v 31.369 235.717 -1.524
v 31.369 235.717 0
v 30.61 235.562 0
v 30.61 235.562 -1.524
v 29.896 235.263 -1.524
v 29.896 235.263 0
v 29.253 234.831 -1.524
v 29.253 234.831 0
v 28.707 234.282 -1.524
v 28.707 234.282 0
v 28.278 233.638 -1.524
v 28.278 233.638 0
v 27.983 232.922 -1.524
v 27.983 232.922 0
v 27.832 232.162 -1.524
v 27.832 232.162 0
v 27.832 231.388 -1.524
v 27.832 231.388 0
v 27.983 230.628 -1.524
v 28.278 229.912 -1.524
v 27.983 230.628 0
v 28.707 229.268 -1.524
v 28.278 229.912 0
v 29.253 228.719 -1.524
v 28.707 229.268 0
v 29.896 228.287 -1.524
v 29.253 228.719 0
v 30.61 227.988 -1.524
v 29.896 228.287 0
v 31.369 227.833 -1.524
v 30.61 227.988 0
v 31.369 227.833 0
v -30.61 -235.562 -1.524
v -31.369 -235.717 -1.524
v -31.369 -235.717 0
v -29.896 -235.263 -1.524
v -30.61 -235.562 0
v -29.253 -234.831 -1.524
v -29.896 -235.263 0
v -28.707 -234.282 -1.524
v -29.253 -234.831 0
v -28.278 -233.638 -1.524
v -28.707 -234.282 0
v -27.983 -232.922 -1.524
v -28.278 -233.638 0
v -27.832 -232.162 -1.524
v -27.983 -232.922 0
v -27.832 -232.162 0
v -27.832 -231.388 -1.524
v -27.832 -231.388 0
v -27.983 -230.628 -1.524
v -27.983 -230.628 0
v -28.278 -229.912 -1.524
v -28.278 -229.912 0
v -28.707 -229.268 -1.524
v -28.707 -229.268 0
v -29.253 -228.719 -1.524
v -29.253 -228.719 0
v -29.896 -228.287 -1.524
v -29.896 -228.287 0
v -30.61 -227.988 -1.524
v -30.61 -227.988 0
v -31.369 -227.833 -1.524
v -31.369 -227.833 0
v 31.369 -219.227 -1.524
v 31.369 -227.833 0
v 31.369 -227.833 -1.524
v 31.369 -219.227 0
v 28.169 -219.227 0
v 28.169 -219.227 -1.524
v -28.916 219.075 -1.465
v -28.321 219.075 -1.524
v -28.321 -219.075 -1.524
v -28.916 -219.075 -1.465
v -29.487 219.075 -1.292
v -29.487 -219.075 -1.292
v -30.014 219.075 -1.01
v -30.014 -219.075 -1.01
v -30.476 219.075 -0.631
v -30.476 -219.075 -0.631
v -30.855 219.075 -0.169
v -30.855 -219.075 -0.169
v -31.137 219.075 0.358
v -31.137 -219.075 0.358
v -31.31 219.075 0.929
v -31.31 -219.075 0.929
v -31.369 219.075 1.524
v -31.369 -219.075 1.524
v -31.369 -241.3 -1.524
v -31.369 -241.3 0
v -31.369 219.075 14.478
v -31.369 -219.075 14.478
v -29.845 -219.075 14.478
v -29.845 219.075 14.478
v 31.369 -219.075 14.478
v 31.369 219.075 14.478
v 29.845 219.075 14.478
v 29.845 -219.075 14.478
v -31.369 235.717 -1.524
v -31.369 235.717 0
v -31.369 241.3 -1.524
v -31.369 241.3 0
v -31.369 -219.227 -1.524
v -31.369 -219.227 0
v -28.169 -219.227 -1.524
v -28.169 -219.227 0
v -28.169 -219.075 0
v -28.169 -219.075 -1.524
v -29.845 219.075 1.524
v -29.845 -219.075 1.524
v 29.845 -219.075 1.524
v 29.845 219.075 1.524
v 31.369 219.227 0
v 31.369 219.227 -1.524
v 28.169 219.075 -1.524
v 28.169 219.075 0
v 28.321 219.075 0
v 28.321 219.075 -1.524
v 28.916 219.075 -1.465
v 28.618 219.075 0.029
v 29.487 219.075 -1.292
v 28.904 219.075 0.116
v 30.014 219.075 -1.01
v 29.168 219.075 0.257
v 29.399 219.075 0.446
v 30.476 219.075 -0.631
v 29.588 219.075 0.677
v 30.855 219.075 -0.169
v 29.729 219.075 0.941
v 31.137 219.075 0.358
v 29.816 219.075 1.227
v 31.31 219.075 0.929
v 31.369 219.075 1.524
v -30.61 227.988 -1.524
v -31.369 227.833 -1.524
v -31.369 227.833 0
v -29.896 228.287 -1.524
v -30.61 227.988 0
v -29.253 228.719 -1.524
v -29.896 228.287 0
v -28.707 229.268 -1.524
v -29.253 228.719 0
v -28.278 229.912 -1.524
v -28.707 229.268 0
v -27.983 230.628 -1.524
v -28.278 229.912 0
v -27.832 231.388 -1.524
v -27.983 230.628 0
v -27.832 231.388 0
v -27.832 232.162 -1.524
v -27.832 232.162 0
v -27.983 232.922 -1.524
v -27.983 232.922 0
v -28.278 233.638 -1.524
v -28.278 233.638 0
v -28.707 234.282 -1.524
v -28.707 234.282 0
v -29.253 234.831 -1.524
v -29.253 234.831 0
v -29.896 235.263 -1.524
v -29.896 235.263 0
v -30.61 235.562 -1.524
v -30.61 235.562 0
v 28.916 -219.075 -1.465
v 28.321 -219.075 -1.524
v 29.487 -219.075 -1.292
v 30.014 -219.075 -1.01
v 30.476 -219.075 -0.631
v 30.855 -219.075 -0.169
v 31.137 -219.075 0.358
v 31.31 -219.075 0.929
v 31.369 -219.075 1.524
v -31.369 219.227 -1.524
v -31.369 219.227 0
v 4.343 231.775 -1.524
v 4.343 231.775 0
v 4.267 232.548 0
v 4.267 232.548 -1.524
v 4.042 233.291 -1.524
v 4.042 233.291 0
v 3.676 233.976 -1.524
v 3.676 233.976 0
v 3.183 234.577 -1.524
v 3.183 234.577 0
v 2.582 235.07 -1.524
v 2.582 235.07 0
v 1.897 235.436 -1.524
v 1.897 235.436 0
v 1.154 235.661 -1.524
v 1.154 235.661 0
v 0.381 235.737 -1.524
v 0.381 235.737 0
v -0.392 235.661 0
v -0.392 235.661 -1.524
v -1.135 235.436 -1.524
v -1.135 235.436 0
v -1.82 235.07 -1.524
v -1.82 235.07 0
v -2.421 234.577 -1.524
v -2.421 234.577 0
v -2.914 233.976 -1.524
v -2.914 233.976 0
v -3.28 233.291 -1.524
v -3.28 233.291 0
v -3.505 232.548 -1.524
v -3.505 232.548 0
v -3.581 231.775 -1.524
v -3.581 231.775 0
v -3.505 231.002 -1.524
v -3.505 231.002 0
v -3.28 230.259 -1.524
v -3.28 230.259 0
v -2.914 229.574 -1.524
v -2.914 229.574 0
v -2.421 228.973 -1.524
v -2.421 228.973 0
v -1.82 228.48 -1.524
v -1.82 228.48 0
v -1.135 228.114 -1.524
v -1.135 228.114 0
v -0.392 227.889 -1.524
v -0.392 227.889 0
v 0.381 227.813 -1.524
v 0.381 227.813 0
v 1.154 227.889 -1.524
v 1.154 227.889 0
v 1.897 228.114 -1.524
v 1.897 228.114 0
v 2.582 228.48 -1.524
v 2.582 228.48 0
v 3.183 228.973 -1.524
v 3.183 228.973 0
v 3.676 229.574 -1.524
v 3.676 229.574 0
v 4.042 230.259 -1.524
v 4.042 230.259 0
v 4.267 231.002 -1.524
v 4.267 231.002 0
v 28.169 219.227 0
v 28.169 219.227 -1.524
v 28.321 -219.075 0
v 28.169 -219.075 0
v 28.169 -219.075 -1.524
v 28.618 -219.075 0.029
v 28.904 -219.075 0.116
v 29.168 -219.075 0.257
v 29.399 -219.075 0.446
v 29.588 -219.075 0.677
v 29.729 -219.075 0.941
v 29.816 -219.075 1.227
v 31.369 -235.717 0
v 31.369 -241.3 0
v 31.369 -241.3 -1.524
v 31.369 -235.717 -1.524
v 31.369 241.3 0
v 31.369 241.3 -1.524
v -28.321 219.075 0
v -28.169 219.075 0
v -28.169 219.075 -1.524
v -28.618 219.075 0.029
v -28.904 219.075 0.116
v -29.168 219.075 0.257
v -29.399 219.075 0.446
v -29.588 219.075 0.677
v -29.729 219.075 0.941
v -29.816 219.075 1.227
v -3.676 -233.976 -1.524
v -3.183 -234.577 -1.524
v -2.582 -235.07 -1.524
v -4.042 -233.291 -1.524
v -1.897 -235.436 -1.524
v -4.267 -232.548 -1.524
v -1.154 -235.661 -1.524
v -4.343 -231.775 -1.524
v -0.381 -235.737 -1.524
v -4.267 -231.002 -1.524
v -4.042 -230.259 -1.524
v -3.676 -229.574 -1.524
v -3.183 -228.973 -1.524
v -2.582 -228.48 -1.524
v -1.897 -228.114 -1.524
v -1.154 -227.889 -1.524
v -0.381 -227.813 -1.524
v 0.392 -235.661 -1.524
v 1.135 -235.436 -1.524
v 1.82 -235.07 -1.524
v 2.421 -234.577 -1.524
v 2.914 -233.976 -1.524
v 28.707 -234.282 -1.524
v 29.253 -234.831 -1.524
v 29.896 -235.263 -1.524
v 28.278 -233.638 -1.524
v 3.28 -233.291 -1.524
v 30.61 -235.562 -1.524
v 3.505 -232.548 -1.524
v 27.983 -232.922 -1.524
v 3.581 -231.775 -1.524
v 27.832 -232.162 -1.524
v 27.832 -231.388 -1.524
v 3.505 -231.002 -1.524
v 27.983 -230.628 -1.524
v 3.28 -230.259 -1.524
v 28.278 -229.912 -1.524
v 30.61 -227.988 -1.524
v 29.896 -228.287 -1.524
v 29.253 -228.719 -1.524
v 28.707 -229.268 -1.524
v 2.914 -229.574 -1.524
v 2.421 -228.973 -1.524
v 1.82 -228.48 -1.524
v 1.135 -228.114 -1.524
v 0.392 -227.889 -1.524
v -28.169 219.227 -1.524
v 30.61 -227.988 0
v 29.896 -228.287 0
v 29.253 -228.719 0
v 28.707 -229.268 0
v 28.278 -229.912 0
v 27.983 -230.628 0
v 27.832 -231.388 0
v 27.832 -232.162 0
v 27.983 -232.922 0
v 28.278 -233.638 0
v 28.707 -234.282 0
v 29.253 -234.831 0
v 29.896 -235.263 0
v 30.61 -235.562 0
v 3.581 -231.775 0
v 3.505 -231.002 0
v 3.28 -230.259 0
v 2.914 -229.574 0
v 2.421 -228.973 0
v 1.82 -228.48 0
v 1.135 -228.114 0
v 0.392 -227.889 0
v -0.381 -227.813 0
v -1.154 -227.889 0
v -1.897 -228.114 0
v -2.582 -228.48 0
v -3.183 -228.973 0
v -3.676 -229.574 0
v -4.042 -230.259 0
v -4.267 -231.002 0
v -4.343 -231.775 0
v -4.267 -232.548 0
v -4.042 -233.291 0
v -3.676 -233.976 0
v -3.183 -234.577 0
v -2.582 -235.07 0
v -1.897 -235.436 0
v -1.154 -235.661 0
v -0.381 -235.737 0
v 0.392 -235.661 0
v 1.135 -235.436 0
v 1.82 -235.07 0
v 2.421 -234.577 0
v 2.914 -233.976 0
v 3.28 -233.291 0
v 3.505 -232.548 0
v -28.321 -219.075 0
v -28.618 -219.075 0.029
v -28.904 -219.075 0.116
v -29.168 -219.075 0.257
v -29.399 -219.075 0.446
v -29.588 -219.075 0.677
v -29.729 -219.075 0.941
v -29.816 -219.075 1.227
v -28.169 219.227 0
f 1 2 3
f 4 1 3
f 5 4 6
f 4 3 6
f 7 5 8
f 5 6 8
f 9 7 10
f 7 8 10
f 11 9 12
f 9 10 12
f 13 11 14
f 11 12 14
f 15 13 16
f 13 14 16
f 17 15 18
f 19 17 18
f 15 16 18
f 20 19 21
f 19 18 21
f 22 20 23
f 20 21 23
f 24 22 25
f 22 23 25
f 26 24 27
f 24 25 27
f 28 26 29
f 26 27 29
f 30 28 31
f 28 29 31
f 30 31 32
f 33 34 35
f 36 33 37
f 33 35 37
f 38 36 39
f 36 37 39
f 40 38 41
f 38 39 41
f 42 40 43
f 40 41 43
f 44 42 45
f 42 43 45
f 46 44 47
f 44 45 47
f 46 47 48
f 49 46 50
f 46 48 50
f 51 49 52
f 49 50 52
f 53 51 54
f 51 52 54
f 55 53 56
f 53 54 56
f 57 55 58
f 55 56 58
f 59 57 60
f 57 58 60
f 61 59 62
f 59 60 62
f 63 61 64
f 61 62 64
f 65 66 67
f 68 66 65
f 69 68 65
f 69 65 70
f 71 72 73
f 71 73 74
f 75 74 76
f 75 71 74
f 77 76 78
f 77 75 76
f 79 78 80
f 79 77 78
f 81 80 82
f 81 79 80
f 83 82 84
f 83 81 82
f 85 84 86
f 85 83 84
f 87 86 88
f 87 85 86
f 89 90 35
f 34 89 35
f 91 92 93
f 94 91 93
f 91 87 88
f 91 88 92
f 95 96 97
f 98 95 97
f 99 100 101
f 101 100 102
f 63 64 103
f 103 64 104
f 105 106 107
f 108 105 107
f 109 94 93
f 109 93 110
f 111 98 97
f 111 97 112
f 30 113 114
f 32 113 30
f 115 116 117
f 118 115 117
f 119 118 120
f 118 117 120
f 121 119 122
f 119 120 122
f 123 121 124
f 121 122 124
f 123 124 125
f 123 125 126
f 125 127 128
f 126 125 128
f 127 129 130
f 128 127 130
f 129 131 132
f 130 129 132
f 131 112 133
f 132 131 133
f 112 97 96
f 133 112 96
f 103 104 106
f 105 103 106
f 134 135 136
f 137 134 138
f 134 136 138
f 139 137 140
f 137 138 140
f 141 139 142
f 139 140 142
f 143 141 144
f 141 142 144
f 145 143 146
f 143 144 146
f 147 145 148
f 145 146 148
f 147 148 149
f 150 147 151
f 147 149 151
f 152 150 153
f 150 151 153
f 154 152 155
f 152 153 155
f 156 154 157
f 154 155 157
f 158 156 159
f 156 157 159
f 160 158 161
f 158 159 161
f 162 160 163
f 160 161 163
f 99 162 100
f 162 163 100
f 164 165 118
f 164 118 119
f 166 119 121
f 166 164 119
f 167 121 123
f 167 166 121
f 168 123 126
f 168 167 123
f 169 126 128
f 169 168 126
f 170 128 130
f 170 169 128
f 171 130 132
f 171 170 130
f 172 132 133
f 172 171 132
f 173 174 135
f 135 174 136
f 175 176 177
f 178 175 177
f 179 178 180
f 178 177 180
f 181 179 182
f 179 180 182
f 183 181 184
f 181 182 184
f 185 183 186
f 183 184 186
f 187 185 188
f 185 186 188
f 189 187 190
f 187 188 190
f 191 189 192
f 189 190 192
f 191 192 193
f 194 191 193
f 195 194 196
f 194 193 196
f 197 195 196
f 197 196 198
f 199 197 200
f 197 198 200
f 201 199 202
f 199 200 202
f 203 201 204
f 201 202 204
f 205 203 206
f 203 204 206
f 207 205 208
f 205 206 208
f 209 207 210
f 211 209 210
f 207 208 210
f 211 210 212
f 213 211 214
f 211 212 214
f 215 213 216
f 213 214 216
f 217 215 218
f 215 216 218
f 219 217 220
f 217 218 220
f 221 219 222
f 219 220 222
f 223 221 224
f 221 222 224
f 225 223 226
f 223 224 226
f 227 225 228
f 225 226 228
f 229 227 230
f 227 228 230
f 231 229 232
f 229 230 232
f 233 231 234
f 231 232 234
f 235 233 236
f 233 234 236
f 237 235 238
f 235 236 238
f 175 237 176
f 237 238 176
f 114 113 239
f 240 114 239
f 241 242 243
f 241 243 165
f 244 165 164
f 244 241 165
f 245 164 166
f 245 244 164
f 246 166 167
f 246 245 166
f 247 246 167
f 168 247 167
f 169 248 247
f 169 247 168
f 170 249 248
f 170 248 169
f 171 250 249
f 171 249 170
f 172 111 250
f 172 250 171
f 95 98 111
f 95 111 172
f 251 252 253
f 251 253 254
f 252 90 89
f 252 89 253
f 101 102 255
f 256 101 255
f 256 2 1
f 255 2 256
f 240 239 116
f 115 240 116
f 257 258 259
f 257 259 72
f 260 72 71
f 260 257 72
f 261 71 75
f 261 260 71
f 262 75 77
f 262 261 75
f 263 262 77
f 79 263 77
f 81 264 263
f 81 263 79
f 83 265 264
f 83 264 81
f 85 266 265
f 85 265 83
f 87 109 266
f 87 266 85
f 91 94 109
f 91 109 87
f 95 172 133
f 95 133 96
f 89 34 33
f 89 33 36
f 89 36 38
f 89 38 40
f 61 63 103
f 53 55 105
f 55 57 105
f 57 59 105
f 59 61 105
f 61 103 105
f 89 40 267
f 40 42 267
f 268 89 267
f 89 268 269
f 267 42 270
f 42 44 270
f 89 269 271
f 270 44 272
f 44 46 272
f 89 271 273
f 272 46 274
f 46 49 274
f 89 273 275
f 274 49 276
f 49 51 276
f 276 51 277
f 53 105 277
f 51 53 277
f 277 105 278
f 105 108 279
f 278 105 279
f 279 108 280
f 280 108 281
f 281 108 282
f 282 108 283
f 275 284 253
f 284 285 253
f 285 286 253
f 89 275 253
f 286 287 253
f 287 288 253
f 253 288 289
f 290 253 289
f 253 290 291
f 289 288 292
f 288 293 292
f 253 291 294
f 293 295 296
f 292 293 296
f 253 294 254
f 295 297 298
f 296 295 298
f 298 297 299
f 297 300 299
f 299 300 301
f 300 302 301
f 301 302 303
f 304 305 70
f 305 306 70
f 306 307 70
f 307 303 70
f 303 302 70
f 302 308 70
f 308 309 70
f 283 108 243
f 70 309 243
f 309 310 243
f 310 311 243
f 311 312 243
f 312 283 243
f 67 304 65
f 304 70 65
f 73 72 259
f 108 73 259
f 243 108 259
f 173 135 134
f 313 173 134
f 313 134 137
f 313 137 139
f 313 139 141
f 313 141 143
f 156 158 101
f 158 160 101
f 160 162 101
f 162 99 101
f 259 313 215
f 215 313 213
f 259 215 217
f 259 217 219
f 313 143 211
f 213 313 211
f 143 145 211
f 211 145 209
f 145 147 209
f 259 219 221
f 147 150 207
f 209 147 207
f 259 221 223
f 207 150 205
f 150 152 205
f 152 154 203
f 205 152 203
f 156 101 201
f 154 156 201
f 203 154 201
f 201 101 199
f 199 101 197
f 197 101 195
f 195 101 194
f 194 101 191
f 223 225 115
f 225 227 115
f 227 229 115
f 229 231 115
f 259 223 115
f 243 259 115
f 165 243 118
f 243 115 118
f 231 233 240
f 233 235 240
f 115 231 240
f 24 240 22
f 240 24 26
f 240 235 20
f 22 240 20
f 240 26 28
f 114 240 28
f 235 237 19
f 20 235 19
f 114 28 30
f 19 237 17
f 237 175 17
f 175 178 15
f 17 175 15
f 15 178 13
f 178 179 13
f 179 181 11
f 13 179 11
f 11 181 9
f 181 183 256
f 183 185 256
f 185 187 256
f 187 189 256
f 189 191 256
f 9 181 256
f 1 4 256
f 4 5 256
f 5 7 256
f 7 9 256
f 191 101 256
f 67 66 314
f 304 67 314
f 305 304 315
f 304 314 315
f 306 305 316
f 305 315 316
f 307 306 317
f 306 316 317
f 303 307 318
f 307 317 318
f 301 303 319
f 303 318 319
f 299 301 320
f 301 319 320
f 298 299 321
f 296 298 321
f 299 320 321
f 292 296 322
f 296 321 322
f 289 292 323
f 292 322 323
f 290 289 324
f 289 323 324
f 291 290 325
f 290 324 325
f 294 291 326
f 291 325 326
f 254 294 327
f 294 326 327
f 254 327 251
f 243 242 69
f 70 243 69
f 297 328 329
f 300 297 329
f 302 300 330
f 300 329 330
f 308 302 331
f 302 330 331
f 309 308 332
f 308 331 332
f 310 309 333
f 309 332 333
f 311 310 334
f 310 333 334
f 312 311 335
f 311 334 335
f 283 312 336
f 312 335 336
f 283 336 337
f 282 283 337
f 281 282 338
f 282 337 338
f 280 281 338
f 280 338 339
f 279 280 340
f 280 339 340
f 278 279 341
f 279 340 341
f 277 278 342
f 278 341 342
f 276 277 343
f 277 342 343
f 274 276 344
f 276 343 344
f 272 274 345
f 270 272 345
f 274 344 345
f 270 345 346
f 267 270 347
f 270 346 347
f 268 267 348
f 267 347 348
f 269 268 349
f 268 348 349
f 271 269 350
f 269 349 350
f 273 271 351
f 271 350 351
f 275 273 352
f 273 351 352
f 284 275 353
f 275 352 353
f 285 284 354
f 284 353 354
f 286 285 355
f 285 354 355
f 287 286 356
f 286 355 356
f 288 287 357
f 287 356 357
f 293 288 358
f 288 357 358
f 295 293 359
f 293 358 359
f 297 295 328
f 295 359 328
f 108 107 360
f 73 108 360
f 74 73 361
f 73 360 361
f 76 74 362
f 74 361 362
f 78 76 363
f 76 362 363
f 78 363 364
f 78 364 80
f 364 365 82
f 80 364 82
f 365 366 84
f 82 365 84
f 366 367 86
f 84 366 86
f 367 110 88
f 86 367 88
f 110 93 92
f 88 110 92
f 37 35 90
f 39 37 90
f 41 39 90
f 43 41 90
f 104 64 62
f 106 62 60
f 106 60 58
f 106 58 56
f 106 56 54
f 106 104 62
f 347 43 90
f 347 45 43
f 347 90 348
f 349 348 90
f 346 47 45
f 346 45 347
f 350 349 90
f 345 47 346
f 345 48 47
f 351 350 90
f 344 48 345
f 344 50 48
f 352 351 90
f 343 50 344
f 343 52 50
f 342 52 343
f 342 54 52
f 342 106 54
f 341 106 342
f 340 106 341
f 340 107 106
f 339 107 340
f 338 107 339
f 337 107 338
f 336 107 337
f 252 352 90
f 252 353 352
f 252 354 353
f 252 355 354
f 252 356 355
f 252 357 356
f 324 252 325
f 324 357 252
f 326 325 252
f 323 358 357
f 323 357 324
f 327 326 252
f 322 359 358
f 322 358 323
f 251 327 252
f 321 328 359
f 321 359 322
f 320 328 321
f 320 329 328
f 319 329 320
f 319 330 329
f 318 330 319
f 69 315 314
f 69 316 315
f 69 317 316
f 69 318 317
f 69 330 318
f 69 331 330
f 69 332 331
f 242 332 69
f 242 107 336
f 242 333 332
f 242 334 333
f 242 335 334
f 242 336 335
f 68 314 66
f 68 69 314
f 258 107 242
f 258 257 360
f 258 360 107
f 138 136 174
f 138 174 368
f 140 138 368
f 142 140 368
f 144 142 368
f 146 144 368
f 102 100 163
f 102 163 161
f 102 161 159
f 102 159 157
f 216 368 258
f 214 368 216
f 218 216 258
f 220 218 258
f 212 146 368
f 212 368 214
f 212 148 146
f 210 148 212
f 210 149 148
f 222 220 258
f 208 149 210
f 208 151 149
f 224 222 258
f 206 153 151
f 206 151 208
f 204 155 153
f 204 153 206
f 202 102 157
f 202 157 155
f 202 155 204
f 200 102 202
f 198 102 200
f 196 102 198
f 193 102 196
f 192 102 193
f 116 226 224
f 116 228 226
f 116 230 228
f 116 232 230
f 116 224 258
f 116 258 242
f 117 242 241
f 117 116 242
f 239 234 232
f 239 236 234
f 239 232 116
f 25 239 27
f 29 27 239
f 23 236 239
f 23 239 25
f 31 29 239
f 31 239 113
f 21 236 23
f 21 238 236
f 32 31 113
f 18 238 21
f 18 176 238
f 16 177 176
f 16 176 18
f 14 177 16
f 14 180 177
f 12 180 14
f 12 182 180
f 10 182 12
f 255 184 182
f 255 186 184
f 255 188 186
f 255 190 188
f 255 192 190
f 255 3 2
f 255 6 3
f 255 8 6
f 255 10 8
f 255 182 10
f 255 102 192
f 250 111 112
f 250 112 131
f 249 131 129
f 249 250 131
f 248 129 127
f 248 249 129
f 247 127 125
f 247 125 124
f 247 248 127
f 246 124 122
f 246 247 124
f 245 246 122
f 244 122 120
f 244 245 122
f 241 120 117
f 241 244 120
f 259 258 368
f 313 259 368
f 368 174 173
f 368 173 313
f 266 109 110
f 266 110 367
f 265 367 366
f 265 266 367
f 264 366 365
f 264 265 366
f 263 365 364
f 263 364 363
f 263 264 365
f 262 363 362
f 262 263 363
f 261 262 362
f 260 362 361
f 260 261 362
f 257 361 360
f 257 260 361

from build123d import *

# Parameters (mm, degrees)
CROQUIS1_W                          = 62.738
CROQUIS1_H                          = 482.6
CROQUIS1_R                          = 3.9624
BRIDA_BASE1_DEPTH                   = 1.524
BRIDA_DE_ARISTA1_STRIP_W            = 9.144
BRIDA_DE_ARISTA1_STRIP_H            = 1.524
BRIDA_DE_ARISTA1_STRIP_CUT_DEPTH    = 438.15
BRIDA_DE_ARISTA1_RELIEF_W           = 9.2964
BRIDA_DE_ARISTA1_RELIEF_H           = 0.1524
BRIDA_DE_ARISTA1_RELIEF_CUT_DEPTH   = 1.524
BRIDA_DE_ARISTA1_STRIP_2_W          = 9.144
BRIDA_DE_ARISTA1_STRIP_2_H          = 1.524
BRIDA_DE_ARISTA1_STRIP_CUT_2_DEPTH  = 438.15
BRIDA_DE_ARISTA1_RELIEF_2_W         = 9.2964
BRIDA_DE_ARISTA1_RELIEF_2_H         = 0.1524
BRIDA_DE_ARISTA1_RELIEF_CUT_2_DEPTH = 1.524
BRIDA_DE_ARISTA1_DEPTH              = 438.15
BRIDA_DE_ARISTA1_BEND_DEPTH         = 438.15
CROQUIS15_R                         = 3.9624
CORTAR_EXTRUIR1_DEPTH               = 244.760777495


# Sheet-metal steps are written as plain solids
with BuildPart() as part:
    # Croquis1 → Brida base1 (new body)
    with BuildSketch(Plane.XY):
        Rectangle(CROQUIS1_W, CROQUIS1_H)
        with Locations((0.381, 231.775)):
            Circle(CROQUIS1_R, mode=Mode.SUBTRACT)
        with Locations((-0.381, -231.775)):
            Circle(CROQUIS1_R, mode=Mode.SUBTRACT)
    extrude(amount=-BRIDA_BASE1_DEPTH)

    # Brida de arista1 strip (across the edge) → Brida de arista1 strip cut (cut)
    with BuildSketch(Plane(origin=(31.369, -219.075, 0), x_dir=(-1, 0, 0), z_dir=(0, 1, 0))):
        with Locations((-1.524, -0.762)):
            Rectangle(BRIDA_DE_ARISTA1_STRIP_W, BRIDA_DE_ARISTA1_STRIP_H)
    extrude(amount=BRIDA_DE_ARISTA1_STRIP_CUT_DEPTH, mode=Mode.SUBTRACT)

    # Brida de arista1 relief (on the sheet) → Brida de arista1 relief cut (cut)
    with BuildSketch(Plane(origin=(28.321, -219.075, 0), x_dir=(-1, 0, 0), z_dir=(0, 0, 1))):
        with Locations((-4.4958, 0.0762)):
            Rectangle(BRIDA_DE_ARISTA1_RELIEF_W, BRIDA_DE_ARISTA1_RELIEF_H)
        with Locations((-4.4958, -438.2262)):
            Rectangle(BRIDA_DE_ARISTA1_RELIEF_W, BRIDA_DE_ARISTA1_RELIEF_H)
    extrude(amount=-BRIDA_DE_ARISTA1_RELIEF_CUT_DEPTH, mode=Mode.SUBTRACT)

    # Brida de arista1 strip 2 (across the edge) → Brida de arista1 strip cut 2 (cut)
    with BuildSketch(Plane(origin=(-31.369, 219.075, 0), x_dir=(1, 0, 0), z_dir=(0, -1, 0))):
        with Locations((-1.524, -0.762)):
            Rectangle(BRIDA_DE_ARISTA1_STRIP_2_W, BRIDA_DE_ARISTA1_STRIP_2_H)
    extrude(amount=BRIDA_DE_ARISTA1_STRIP_CUT_2_DEPTH, mode=Mode.SUBTRACT)

    # Brida de arista1 relief 2 (on the sheet) → Brida de arista1 relief cut 2 (cut)
    with BuildSketch(Plane(origin=(-28.321, 219.075, 0), x_dir=(1, 0, 0), z_dir=(0, 0, 1))):
        with Locations((-4.4958, 0.0762)):
            Rectangle(BRIDA_DE_ARISTA1_RELIEF_2_W, BRIDA_DE_ARISTA1_RELIEF_2_H)
        with Locations((-4.4958, -438.2262)):
            Rectangle(BRIDA_DE_ARISTA1_RELIEF_2_W, BRIDA_DE_ARISTA1_RELIEF_2_H)
    extrude(amount=-BRIDA_DE_ARISTA1_RELIEF_CUT_2_DEPTH, mode=Mode.SUBTRACT)

    # Brida de arista1 section (across the edge) → Brida de arista1 (add)
    with BuildSketch(Plane(origin=(31.369, -219.075, 0), x_dir=(-1, 0, 0), z_dir=(0, 1, 0))):
        with BuildLine():
            Line((0, 1.524), (0, 14.478))
            Line((0, 14.478), (1.524, 14.478))
            Line((1.524, 14.478), (1.524, 1.524))
            ThreePointArc((1.524, 1.524), (1.970369265, 0.446369265), (3.048, 0))
            Line((3.048, 0), (3.048, -1.524))
            ThreePointArc((3.048, -1.524), (0.892738531, -0.631261469), (0, 1.524))
        make_face()
    extrude(amount=BRIDA_DE_ARISTA1_DEPTH)

    # Brida de arista1 section 2 (across the edge) → Brida de arista1 bend (add)
    with BuildSketch(Plane(origin=(-31.369, 219.075, 0), x_dir=(1, 0, 0), z_dir=(0, -1, 0))):
        with BuildLine():
            Line((0, 1.524), (0, 14.478))
            Line((0, 14.478), (1.524, 14.478))
            Line((1.524, 14.478), (1.524, 1.524))
            ThreePointArc((1.524, 1.524), (1.970369265, 0.446369265), (3.048, 0))
            Line((3.048, 0), (3.048, -1.524))
            ThreePointArc((3.048, -1.524), (0.892738531, -0.631261469), (0, 1.524))
        make_face()
    extrude(amount=BRIDA_DE_ARISTA1_BEND_DEPTH)

    # Croquis15 → Cortar-Extruir1 (cut, through all)
    with BuildSketch(Plane.XY):
        with Locations((-31.7754, 231.775)):
            Circle(CROQUIS15_R)
        with Locations((-31.7754, -231.775)):
            Circle(CROQUIS15_R)
        with Locations((31.7754, -231.775)):
            Circle(CROQUIS15_R)
        with Locations((31.7754, 231.775)):
            Circle(CROQUIS15_R)
    extrude(amount=-CORTAR_EXTRUIR1_DEPTH, mode=Mode.SUBTRACT)


solid = part.part
